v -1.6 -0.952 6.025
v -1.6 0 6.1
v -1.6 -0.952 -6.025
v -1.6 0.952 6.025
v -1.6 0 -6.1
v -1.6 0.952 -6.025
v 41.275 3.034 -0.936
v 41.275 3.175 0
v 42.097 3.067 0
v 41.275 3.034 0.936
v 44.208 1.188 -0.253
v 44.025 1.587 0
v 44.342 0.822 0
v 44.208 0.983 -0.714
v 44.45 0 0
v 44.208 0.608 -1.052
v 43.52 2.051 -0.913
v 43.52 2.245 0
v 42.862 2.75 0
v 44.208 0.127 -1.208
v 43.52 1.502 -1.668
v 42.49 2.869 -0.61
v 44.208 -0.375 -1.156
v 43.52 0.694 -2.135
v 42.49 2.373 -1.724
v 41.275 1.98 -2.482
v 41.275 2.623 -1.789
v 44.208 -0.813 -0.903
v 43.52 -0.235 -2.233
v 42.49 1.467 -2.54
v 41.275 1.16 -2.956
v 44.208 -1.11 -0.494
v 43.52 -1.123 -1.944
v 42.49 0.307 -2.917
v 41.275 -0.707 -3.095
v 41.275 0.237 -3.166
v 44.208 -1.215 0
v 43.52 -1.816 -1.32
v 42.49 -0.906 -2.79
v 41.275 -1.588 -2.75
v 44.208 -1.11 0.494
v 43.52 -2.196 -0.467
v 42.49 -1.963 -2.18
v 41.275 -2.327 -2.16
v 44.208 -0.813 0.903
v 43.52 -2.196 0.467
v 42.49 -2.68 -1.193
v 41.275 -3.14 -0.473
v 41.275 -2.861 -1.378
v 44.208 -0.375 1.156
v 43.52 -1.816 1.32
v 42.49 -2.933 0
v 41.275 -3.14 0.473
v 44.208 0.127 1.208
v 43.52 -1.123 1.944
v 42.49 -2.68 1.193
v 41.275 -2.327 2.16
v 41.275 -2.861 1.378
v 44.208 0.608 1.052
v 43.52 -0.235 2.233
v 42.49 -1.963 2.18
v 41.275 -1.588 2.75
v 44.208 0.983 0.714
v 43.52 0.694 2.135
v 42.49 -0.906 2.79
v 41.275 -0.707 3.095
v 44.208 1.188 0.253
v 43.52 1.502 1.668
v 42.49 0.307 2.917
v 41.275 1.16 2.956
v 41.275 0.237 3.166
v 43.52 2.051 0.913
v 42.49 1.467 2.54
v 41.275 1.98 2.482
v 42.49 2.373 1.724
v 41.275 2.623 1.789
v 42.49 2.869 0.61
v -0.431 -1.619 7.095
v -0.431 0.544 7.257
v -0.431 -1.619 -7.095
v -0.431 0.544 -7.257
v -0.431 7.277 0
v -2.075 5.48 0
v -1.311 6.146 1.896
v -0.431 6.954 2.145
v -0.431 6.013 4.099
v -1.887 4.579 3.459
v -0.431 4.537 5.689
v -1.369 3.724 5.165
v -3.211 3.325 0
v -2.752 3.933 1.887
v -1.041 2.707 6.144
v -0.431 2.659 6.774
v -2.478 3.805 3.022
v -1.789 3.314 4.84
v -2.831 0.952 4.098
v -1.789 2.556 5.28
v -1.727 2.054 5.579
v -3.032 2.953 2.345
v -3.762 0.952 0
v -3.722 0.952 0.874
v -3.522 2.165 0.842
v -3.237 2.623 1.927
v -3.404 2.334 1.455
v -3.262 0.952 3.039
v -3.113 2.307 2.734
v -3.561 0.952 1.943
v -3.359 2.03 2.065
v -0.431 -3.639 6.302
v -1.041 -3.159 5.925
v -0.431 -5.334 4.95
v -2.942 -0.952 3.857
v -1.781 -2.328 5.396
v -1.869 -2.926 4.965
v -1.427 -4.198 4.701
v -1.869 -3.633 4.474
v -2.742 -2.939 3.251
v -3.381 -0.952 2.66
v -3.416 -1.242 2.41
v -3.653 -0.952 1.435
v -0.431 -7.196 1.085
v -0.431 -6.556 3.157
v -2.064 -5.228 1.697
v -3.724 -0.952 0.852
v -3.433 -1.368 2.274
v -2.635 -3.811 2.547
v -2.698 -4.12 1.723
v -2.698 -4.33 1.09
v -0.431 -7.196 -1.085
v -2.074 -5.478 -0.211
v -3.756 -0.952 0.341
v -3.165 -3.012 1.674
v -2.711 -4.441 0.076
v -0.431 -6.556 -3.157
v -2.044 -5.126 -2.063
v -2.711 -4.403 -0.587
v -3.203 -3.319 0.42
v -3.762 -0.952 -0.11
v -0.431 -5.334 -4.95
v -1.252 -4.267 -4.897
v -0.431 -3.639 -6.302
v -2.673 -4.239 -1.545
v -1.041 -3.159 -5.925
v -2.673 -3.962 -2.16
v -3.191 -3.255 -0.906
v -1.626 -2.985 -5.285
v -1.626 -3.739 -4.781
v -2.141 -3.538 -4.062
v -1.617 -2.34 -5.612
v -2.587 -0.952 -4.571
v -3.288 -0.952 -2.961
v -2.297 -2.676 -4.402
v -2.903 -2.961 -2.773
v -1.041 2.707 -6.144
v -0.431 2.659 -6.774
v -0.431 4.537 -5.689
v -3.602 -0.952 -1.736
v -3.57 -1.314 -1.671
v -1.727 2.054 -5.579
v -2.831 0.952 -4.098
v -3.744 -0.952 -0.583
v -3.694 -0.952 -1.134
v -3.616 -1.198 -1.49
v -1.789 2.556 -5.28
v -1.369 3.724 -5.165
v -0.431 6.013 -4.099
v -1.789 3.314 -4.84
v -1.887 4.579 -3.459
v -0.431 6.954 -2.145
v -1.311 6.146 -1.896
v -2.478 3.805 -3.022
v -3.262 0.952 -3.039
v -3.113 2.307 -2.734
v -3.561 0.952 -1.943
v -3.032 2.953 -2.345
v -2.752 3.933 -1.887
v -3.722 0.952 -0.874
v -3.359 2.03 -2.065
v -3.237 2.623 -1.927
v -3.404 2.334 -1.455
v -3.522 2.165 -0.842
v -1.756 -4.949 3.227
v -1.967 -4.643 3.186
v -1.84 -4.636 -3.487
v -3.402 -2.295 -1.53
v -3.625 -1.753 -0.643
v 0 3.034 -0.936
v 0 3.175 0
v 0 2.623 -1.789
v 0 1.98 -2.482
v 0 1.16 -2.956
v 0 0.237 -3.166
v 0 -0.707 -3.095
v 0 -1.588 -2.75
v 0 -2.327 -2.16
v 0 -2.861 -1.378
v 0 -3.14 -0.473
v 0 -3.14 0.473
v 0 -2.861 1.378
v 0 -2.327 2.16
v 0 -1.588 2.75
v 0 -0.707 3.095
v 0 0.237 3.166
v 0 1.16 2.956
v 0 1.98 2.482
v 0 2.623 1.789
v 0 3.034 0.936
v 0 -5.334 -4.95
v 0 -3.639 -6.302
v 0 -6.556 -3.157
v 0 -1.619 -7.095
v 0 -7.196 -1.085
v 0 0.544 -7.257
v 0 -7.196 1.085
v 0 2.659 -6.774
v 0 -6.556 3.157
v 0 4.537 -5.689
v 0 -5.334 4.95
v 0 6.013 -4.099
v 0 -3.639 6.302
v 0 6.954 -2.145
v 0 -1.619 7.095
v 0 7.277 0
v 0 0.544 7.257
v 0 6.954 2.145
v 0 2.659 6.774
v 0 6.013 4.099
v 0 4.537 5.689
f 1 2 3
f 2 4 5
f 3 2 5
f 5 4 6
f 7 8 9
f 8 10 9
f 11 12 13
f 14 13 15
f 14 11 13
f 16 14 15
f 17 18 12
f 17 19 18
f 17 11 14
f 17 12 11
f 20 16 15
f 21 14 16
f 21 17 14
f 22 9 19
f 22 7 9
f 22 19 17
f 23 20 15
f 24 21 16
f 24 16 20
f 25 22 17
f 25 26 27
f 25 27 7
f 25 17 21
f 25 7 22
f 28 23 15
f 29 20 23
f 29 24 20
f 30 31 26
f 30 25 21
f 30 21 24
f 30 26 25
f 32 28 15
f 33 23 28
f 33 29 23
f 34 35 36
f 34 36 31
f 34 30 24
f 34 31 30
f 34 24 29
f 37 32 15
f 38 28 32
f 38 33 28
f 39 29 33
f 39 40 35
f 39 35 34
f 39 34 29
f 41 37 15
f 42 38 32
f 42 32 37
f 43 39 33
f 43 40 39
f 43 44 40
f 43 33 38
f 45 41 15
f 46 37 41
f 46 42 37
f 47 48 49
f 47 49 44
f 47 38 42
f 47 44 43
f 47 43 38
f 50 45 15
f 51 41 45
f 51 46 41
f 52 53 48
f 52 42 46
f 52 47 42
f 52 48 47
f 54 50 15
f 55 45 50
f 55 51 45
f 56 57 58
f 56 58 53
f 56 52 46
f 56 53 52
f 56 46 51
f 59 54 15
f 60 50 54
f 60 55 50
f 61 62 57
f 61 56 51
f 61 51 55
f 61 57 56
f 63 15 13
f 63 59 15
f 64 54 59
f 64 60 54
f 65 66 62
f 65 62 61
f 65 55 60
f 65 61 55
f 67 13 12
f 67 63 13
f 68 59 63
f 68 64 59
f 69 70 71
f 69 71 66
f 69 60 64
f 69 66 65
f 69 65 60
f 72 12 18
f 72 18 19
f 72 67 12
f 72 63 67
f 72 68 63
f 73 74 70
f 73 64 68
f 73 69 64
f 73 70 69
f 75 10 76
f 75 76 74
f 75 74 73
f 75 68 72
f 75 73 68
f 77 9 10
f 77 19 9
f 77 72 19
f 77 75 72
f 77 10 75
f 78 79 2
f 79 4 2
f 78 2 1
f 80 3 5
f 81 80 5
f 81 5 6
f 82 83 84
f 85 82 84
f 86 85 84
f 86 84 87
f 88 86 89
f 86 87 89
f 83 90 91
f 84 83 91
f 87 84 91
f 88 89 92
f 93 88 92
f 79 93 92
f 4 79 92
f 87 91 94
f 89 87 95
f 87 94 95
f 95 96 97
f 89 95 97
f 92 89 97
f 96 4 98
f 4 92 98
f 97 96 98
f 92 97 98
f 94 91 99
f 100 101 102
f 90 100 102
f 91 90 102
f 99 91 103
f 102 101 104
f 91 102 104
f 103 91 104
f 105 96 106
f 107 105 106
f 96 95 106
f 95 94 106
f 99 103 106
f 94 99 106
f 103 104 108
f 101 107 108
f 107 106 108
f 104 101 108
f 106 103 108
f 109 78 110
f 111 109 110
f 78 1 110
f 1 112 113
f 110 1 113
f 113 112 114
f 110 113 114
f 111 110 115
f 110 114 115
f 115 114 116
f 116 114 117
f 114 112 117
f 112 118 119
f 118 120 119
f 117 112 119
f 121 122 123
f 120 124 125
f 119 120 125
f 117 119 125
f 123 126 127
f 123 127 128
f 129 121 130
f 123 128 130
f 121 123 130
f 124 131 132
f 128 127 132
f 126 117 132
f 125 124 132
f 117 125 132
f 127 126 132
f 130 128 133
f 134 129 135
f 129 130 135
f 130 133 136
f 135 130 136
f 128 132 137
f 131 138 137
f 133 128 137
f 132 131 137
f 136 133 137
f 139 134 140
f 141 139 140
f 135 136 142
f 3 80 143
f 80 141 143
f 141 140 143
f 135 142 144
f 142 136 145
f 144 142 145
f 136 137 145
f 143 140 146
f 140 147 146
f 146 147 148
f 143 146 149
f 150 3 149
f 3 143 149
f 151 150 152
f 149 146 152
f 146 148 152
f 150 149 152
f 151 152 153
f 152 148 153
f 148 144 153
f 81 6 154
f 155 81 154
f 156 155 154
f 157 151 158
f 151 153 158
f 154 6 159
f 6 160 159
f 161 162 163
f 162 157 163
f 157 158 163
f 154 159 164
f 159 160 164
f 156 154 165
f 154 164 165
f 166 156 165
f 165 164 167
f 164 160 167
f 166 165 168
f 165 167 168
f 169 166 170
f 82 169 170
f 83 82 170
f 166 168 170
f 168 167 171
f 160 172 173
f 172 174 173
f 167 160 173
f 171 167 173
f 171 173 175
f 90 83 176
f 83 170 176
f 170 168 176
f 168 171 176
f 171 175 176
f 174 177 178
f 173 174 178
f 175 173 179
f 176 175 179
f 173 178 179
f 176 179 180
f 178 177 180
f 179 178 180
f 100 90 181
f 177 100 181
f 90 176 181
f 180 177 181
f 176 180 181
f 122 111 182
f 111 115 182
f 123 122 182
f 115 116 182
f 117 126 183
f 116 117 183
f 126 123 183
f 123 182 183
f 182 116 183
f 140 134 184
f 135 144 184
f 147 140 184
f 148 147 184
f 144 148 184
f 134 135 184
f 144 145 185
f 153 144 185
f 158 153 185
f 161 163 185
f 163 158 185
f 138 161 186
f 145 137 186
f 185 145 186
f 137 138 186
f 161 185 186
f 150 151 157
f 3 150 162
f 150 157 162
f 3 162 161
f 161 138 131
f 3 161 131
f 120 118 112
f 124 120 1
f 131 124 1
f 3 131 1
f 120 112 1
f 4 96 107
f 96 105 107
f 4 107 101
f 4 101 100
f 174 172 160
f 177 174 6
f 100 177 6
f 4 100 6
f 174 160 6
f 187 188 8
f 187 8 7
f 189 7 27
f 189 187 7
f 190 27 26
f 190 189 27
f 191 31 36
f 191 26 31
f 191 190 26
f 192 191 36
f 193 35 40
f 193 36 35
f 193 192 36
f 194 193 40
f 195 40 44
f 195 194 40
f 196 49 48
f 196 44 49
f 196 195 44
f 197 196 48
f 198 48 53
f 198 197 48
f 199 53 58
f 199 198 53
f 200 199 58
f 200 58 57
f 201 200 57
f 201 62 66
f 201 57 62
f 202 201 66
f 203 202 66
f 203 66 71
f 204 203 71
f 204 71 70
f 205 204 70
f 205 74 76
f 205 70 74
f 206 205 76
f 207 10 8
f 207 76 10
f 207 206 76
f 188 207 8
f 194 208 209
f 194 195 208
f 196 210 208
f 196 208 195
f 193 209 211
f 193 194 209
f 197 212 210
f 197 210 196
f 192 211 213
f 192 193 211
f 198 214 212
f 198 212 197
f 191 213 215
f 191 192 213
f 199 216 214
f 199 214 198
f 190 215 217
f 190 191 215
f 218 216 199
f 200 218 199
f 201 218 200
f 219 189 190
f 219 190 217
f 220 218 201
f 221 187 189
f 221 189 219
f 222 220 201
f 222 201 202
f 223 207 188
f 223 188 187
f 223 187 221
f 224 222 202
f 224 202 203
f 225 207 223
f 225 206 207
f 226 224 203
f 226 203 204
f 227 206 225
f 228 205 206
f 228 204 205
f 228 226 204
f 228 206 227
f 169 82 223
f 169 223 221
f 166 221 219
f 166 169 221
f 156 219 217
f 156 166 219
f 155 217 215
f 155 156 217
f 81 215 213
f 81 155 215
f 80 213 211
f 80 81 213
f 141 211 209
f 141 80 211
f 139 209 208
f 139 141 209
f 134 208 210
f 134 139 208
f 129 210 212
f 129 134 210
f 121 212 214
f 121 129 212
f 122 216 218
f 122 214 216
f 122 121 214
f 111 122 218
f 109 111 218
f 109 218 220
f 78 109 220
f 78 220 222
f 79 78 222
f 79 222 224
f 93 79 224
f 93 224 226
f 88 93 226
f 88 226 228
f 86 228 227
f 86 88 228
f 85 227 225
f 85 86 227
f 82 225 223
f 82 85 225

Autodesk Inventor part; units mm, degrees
ref_plane "YZ Plane" through (0, 0, 0) normal (1, 0, 0) x (0, 1, 0)
sketch "Sketch1" plane through (0, 0, 0) normal (0, 0, 1) x (1, 0, 0)
  line L0 (-3.81, 0) -> (44.45, 0)
  line L1 (44.45, 0) -> (44.45, 3.175)
  line L2 (44.45, 3.175) -> (0, 3.175)
  line L3 (0, 3.175) -> (0, 7.2771)
  line L4 (-14.4263, 0) -> (54.2627, 0) projected
  line L5 (0, -1.5301) -> (0, 9.1803) projected
  line L6 (0, 7.2771) -> (-0.4307, 7.2771)
  arc A0 (-0.4307, 7.2771) -> (-3.81, 0) centre (5.715, 0) ccw
  dimension "d0" = 44.45
  dimension "d3" = 3.81
  dimension "d4" = 6.35
  dimension "d9" = 14.5542
  dimension "d10" = 0
  dimension "d13" = 9.525
revolve "Body" add sketch "Sketch1" angle 360 about axis through (-3.81, 0, 0) along (1, 0, 0)
ref_plane "IDS_WORKPLANE{1}" through (-3.81, 0, 0) normal (1, 0, 0) x (0, 0, -1)
sketch "Sketch2" plane through (-3.81, 0, 0) normal (1, 0, 0) x (0, 0, -1)
  circle A0 centre (0, 0) radius 7.2771 projected
  line L0 (0, -10.1879) -> (0, 10.1879) projected
  line L1 (10.1879, 0) -> (-10.1879, 0) projected
  line L2 (-7.2771, 0.9525) -> (7.2771, 0.9525)
  line L3 (7.2771, 0.9525) -> (7.2771, -0.9525)
  line L4 (7.2771, -0.9525) -> (-7.2771, -0.9525)
  line L5 (-7.2771, -0.9525) -> (-7.2771, 0.9525)
  line L6 (-7.2771, 0) -> (7.2771, 0) construction
  line L7 (0, 0.9525) -> (0, -0.9525) construction
  dimension "d15" = 1.905
extrude "Slot" cut sketch "Sketch2" along normal blind 2.2098 contours L1 L0 L2 A0 | L3 L4 A0 | A0 L4 L0 L1 | A0 L2 L3 | L1 A0 L2 L0 | L0 L4 A0 L1 | L5 L2 A0 | A0 L4 L5
thread "Thread" size "1/4-28 UNF" class "2A" standard "ANSI Unified Screw Threads" length 37.7825
sketch "Sketch3" plane through (0, 0, 0) normal (0, 0, 1) x (1, 0, 0)
  line L0 (44.45, 0) -> (44.45, 3.175) projected
  line L1 (-3.81, 0) -> (44.45, 0) projected
  arc A0 (44.45, 0) -> (41.275, 3.175) centre (41.275, 0) ccw
  line L2 (44.45, -3.175) -> (44.45, 3.175) projected
  line L3 (41.275, 3.175) -> (41.275, 0)
  line L4 (41.275, 0) -> (44.45, 0)
  line L5 (0, 3.175) -> (44.45, 3.175) projected
revolve "Fillet" cut sketch "Sketch3" angle 360 about axis through (-3.81, 0, 0) along (1, 0, 0) contours A0 L5 L0
ref_plane "Work Plane2" through (1.4224, 0, 0) normal (0, 0, -1) x (1, 0, 0)
equation "\"d0\" = NLG"
equation "\"d3\" = KOH"
equation "\"d4\" = GD"
equation "\"d9\" = KOD"
equation "\"d13\" = KR"
equation "\"d15\" = SBR"
equation "\"d16\" = STI"
equation "\"d11\" = GEL"
equation "\"GD\" = NND"
equation "\"NLG\" = 44.45"
equation "\"GEL\" = 37.7825"
equation "\"KOD\" = 14.5542"
equation "\"KOH\" = 3.81"
equation "\"SBR\" = 1.905"
equation "\"STI\" = 2.2098"
equation "\"KEWI\" = 0"
equation "\"KR\" = 9.525"
equation "\"d14\" = -KOH"
equation "\"GUL\" = GAL"
equation "\"SPD\" = 5.44322"
equation "\"THREADDIA\" = 6.35"
equation "\"TOA\" = 30deg"
equation "\"BDM\" = NND"
equation "\"NND\" = 6.35"
equation "\"GAL\" = 0.45339"
equation "\"GD1\" = 5.44322"
properties part number "ANSI B18.6.3 - 1/4 - 28 - 1 3/4, STHMSI" material "Steel, Mild"
